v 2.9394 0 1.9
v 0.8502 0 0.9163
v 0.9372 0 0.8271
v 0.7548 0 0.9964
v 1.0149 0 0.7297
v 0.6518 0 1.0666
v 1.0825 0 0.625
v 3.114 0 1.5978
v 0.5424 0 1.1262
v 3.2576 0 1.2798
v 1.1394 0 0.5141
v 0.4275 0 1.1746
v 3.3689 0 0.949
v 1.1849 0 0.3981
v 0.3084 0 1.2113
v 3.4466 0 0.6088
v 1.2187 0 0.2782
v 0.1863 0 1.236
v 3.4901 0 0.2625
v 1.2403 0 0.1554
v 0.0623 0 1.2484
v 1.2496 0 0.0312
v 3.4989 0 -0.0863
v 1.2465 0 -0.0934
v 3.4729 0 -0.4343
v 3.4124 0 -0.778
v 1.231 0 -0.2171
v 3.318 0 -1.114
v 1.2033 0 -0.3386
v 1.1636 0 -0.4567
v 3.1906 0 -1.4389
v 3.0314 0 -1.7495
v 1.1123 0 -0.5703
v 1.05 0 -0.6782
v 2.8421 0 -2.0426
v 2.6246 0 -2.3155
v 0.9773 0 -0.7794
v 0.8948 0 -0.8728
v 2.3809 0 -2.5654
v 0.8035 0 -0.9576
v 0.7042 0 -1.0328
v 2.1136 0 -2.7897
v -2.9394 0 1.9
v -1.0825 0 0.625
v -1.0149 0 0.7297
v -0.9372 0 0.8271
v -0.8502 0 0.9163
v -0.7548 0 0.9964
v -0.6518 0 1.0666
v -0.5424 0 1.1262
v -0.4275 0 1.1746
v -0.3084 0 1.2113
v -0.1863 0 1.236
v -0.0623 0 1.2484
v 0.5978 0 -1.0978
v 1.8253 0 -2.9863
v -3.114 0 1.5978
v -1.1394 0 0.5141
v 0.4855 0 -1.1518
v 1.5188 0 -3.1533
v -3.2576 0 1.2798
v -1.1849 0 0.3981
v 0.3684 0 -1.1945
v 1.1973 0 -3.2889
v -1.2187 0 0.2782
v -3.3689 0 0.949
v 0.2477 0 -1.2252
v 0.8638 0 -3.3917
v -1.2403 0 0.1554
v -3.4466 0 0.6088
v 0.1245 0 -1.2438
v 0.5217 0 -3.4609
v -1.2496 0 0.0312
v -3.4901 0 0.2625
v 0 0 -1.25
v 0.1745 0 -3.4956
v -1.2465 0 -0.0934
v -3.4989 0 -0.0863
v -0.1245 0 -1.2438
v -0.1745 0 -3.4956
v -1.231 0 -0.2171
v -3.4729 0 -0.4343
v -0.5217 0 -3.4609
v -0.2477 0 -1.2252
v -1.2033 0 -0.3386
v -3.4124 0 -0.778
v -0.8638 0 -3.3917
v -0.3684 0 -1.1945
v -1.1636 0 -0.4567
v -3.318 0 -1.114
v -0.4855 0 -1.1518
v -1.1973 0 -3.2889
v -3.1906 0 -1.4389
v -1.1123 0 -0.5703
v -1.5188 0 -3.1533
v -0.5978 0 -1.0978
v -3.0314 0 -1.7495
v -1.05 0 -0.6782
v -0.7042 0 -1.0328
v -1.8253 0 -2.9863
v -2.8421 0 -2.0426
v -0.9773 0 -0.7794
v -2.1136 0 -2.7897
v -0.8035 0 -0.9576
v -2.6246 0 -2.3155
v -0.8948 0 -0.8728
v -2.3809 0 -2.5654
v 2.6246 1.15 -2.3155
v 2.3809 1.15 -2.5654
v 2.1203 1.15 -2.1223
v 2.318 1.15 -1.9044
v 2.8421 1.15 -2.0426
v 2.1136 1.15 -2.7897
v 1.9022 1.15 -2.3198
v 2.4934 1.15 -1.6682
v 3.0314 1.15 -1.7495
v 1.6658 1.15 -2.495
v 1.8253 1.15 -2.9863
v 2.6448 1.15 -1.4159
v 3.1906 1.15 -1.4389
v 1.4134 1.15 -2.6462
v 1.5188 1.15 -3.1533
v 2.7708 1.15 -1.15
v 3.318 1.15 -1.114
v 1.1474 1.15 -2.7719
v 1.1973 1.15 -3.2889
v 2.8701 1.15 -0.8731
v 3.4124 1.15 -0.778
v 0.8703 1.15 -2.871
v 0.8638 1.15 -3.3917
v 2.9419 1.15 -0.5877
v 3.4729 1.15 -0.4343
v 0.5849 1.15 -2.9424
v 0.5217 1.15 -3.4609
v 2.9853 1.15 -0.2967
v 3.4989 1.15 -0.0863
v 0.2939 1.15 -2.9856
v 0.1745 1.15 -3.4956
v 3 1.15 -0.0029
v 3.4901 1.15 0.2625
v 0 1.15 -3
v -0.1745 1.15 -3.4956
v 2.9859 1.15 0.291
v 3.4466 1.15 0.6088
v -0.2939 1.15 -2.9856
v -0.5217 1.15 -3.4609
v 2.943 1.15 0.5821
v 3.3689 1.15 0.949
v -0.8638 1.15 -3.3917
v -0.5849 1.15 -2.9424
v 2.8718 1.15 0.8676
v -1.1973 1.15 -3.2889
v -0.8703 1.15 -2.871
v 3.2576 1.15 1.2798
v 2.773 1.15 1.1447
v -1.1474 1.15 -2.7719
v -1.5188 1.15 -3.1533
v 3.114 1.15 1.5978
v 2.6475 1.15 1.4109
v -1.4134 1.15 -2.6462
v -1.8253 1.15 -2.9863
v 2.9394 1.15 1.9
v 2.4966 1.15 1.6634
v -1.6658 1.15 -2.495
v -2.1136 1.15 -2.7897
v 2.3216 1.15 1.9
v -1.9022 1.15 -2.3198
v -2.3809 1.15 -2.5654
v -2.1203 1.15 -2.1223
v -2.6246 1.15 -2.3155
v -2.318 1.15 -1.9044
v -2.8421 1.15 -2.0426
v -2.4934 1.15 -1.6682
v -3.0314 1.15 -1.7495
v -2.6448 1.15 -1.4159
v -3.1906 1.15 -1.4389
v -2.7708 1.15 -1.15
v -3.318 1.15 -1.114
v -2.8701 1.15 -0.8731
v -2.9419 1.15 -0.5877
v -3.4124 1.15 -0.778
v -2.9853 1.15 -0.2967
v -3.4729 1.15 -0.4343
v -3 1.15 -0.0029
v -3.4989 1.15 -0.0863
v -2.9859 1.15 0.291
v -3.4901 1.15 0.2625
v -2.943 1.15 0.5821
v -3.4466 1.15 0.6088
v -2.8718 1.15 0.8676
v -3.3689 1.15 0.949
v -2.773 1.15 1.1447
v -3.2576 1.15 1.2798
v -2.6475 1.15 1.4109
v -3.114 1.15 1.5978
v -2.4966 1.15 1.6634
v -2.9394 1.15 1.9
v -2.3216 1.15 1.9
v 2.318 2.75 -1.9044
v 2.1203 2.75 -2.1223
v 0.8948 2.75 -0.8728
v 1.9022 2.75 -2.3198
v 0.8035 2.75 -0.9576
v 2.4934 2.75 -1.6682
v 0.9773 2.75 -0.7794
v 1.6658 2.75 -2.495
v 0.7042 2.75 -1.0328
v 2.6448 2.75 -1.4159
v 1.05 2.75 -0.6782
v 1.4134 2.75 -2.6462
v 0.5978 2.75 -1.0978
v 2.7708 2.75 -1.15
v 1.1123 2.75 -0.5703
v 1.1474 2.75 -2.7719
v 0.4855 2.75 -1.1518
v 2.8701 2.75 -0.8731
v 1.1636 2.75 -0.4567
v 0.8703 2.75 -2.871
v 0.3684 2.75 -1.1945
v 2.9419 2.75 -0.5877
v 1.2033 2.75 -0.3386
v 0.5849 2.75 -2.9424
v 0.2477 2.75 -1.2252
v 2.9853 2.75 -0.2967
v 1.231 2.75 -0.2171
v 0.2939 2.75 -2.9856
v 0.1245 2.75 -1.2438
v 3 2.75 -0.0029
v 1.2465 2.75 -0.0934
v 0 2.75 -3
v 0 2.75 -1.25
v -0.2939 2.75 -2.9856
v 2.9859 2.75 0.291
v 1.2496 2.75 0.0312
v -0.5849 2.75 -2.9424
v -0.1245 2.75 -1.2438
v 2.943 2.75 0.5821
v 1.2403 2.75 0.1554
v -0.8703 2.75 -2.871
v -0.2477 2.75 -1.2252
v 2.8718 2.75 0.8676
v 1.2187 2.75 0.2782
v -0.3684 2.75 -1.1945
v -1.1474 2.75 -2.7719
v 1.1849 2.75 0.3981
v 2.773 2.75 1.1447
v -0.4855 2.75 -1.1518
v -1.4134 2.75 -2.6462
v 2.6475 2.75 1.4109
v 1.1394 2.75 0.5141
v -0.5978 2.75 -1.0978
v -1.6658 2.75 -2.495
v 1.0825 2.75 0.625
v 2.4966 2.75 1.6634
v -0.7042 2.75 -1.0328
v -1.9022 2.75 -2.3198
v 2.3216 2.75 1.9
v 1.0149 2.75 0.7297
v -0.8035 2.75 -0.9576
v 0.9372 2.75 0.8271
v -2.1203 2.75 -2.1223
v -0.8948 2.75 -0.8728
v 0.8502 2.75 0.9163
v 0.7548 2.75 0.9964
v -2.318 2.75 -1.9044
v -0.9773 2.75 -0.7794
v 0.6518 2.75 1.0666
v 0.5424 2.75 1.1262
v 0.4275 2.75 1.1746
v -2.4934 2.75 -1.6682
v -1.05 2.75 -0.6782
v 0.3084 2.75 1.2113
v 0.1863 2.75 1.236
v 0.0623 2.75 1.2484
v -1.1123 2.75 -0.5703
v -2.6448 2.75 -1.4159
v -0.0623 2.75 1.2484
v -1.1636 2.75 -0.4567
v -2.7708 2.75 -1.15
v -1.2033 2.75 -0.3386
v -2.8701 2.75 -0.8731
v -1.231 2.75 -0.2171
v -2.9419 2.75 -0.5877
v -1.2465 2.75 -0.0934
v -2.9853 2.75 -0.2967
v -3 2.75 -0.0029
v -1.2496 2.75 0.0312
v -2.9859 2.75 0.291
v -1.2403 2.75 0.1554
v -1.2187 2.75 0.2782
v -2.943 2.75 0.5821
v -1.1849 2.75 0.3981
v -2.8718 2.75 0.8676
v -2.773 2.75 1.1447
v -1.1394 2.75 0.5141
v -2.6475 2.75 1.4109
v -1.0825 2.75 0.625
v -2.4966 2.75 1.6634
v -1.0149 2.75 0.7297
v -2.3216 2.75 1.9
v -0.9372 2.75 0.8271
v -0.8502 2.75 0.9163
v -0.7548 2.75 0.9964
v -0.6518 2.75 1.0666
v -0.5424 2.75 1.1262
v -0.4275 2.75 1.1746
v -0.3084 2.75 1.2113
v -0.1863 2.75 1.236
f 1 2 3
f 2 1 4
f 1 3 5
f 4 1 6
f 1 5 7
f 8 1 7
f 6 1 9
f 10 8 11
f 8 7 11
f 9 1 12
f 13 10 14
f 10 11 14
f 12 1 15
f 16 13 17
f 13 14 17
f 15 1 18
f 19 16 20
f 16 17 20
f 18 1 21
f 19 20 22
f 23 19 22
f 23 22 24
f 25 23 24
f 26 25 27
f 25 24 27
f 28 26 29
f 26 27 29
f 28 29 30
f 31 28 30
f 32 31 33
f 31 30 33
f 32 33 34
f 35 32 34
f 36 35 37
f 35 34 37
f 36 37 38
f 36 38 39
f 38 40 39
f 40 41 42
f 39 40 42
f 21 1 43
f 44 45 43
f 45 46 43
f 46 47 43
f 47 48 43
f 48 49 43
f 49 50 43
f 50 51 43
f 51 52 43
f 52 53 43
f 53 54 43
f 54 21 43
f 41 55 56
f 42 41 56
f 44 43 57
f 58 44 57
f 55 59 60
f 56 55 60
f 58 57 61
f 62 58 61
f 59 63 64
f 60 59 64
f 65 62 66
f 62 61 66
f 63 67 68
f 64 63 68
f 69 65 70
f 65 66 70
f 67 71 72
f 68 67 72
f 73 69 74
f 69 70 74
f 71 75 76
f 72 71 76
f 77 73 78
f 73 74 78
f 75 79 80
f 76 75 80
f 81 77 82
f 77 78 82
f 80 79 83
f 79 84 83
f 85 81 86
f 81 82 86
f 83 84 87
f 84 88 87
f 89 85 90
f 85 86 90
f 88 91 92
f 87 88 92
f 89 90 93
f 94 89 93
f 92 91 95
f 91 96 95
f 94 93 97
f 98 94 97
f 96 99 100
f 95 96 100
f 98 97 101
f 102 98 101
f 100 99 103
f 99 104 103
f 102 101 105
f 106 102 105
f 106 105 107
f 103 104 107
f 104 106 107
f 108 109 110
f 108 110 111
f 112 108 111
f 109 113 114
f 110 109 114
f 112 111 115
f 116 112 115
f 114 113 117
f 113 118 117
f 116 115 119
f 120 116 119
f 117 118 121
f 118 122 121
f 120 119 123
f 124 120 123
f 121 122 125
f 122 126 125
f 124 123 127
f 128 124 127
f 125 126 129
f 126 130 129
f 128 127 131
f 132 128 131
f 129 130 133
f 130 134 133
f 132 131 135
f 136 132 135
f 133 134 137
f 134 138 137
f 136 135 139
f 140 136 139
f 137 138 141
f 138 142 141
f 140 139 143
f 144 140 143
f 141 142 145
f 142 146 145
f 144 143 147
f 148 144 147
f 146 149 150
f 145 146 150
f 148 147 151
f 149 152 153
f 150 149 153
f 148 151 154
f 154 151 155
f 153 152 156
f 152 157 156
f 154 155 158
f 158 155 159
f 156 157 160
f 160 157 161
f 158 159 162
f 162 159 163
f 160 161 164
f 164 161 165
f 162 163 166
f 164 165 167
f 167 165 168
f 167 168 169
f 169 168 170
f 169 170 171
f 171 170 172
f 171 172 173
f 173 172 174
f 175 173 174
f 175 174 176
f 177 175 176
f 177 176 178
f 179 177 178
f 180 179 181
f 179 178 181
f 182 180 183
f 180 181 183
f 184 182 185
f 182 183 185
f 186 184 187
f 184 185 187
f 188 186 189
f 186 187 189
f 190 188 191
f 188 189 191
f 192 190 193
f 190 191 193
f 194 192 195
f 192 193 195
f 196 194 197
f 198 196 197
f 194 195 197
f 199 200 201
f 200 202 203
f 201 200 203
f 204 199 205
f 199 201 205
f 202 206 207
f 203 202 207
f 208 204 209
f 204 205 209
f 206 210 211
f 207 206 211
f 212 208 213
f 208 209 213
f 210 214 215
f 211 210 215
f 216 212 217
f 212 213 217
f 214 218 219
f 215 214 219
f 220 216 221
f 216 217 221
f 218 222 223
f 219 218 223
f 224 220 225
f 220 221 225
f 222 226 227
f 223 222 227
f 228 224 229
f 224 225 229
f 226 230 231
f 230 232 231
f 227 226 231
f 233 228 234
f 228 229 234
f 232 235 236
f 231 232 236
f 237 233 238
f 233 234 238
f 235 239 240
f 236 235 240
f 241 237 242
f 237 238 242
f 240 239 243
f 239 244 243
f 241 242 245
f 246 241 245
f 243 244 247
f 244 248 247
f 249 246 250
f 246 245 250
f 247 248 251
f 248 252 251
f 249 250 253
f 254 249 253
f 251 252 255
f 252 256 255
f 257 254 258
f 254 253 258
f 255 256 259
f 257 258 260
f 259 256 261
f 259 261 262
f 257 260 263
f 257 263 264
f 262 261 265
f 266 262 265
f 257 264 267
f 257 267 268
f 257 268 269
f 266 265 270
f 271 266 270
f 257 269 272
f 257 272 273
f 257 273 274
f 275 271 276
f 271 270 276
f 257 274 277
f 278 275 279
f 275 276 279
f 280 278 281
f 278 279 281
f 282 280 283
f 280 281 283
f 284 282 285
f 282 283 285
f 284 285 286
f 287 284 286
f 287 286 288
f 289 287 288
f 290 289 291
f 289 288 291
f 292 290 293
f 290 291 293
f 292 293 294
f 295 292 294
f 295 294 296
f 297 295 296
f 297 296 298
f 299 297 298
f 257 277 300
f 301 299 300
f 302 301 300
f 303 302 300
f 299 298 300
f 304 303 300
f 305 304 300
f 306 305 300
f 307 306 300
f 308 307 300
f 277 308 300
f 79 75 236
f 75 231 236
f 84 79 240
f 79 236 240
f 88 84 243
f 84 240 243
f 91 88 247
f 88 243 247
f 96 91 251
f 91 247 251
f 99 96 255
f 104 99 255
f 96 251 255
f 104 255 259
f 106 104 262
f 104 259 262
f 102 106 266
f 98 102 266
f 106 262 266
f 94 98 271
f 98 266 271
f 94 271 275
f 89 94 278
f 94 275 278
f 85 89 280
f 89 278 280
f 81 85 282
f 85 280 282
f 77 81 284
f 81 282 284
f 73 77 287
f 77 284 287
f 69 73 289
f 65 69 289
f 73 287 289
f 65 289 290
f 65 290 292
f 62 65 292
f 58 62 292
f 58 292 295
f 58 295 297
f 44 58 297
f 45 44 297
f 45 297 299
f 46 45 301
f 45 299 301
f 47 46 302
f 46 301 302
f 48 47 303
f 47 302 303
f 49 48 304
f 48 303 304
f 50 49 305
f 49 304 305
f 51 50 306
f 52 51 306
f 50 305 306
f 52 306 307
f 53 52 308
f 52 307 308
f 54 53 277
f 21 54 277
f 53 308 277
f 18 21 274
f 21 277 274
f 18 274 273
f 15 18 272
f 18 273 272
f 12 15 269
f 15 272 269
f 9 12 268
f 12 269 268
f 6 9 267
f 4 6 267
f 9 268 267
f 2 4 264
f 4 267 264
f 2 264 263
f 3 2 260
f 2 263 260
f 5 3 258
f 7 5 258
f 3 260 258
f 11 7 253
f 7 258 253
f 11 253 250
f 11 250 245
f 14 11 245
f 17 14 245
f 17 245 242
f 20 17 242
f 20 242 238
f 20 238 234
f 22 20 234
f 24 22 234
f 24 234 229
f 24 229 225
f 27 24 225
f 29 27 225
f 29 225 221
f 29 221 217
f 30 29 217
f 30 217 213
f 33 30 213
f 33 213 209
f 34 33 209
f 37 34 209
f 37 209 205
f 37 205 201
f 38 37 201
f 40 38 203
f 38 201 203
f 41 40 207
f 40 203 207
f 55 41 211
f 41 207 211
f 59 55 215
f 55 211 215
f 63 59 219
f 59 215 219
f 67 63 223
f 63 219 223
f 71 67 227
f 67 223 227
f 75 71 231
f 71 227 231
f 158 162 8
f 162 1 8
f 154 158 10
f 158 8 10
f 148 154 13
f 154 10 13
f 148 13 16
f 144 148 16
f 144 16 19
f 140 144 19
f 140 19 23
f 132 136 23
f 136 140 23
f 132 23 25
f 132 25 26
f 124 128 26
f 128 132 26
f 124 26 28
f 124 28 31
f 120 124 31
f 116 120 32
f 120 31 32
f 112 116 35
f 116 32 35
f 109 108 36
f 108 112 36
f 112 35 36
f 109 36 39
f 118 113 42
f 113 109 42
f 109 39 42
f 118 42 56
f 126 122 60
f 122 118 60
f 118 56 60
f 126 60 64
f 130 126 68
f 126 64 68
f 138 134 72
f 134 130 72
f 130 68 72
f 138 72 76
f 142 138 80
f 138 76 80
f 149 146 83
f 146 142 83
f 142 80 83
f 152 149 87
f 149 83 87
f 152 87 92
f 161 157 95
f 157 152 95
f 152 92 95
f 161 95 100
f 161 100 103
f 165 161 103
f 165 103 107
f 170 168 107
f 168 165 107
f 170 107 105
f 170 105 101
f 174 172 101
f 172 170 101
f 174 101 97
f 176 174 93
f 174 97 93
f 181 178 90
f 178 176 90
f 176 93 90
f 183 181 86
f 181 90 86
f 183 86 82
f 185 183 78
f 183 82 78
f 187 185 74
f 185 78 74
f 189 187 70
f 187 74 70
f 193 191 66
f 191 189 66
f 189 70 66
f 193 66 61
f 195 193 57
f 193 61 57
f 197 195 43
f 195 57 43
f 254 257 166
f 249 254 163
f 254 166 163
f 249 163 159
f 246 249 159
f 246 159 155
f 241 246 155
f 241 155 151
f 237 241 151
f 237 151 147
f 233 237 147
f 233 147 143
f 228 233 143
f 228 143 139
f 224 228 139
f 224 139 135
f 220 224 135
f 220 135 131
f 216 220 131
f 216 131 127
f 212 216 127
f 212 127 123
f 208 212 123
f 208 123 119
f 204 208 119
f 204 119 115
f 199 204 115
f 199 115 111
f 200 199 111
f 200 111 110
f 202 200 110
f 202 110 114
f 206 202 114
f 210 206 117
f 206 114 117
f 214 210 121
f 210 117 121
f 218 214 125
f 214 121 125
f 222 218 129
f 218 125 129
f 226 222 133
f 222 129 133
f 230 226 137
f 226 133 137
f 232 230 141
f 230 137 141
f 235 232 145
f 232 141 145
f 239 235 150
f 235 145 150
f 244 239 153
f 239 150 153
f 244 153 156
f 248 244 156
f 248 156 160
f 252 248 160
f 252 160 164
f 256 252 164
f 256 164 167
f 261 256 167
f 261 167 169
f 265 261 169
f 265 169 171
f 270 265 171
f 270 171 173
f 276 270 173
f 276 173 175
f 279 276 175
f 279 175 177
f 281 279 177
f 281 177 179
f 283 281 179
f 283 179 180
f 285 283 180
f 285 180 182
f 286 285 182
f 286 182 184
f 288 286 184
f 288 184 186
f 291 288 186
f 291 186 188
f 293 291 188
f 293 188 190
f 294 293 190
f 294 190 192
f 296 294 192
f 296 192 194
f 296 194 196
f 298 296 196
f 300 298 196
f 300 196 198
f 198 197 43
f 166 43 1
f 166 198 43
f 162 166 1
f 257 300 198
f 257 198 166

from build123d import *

# Parameters (mm, degrees)
CUT_EXTRUDE_1_DEPTH = 6.662375826


with BuildPart() as part:
    # ｽｹｯﾁ1 → 回転1 (revolve)
    with BuildSketch(Plane.XY, mode=Mode.PRIVATE) as revolve_1_sk:
        Polygon((1.25, 0), (1.25, 2.75), (3, 2.75), (3, 1.15), (3.5, 1.15), (3.5, 0), align=None)
    revolve(revolve_1_sk.sketch.rotate(Axis((0, 0, 0), (0, 1, 0)), 90), axis=Axis((0, 0, 0), (0, 1, 0)))

    # ｽｹｯﾁ2 → ｶｯﾄ - 押し出し1 (cut, through all)
    with BuildSketch(Plane(origin=(0, 2.75, 0), x_dir=(1, 0, 0), z_dir=(0, 1, 0))):
        with BuildLine():
            Line((-2.939387691, -1.9), (2.939387691, -1.9))
            ThreePointArc((2.939387691, -1.9), (0, -3.5), (-2.939387691, -1.9))
        make_face()
    extrude(amount=-CUT_EXTRUDE_1_DEPTH, mode=Mode.SUBTRACT)


solid = part.part
